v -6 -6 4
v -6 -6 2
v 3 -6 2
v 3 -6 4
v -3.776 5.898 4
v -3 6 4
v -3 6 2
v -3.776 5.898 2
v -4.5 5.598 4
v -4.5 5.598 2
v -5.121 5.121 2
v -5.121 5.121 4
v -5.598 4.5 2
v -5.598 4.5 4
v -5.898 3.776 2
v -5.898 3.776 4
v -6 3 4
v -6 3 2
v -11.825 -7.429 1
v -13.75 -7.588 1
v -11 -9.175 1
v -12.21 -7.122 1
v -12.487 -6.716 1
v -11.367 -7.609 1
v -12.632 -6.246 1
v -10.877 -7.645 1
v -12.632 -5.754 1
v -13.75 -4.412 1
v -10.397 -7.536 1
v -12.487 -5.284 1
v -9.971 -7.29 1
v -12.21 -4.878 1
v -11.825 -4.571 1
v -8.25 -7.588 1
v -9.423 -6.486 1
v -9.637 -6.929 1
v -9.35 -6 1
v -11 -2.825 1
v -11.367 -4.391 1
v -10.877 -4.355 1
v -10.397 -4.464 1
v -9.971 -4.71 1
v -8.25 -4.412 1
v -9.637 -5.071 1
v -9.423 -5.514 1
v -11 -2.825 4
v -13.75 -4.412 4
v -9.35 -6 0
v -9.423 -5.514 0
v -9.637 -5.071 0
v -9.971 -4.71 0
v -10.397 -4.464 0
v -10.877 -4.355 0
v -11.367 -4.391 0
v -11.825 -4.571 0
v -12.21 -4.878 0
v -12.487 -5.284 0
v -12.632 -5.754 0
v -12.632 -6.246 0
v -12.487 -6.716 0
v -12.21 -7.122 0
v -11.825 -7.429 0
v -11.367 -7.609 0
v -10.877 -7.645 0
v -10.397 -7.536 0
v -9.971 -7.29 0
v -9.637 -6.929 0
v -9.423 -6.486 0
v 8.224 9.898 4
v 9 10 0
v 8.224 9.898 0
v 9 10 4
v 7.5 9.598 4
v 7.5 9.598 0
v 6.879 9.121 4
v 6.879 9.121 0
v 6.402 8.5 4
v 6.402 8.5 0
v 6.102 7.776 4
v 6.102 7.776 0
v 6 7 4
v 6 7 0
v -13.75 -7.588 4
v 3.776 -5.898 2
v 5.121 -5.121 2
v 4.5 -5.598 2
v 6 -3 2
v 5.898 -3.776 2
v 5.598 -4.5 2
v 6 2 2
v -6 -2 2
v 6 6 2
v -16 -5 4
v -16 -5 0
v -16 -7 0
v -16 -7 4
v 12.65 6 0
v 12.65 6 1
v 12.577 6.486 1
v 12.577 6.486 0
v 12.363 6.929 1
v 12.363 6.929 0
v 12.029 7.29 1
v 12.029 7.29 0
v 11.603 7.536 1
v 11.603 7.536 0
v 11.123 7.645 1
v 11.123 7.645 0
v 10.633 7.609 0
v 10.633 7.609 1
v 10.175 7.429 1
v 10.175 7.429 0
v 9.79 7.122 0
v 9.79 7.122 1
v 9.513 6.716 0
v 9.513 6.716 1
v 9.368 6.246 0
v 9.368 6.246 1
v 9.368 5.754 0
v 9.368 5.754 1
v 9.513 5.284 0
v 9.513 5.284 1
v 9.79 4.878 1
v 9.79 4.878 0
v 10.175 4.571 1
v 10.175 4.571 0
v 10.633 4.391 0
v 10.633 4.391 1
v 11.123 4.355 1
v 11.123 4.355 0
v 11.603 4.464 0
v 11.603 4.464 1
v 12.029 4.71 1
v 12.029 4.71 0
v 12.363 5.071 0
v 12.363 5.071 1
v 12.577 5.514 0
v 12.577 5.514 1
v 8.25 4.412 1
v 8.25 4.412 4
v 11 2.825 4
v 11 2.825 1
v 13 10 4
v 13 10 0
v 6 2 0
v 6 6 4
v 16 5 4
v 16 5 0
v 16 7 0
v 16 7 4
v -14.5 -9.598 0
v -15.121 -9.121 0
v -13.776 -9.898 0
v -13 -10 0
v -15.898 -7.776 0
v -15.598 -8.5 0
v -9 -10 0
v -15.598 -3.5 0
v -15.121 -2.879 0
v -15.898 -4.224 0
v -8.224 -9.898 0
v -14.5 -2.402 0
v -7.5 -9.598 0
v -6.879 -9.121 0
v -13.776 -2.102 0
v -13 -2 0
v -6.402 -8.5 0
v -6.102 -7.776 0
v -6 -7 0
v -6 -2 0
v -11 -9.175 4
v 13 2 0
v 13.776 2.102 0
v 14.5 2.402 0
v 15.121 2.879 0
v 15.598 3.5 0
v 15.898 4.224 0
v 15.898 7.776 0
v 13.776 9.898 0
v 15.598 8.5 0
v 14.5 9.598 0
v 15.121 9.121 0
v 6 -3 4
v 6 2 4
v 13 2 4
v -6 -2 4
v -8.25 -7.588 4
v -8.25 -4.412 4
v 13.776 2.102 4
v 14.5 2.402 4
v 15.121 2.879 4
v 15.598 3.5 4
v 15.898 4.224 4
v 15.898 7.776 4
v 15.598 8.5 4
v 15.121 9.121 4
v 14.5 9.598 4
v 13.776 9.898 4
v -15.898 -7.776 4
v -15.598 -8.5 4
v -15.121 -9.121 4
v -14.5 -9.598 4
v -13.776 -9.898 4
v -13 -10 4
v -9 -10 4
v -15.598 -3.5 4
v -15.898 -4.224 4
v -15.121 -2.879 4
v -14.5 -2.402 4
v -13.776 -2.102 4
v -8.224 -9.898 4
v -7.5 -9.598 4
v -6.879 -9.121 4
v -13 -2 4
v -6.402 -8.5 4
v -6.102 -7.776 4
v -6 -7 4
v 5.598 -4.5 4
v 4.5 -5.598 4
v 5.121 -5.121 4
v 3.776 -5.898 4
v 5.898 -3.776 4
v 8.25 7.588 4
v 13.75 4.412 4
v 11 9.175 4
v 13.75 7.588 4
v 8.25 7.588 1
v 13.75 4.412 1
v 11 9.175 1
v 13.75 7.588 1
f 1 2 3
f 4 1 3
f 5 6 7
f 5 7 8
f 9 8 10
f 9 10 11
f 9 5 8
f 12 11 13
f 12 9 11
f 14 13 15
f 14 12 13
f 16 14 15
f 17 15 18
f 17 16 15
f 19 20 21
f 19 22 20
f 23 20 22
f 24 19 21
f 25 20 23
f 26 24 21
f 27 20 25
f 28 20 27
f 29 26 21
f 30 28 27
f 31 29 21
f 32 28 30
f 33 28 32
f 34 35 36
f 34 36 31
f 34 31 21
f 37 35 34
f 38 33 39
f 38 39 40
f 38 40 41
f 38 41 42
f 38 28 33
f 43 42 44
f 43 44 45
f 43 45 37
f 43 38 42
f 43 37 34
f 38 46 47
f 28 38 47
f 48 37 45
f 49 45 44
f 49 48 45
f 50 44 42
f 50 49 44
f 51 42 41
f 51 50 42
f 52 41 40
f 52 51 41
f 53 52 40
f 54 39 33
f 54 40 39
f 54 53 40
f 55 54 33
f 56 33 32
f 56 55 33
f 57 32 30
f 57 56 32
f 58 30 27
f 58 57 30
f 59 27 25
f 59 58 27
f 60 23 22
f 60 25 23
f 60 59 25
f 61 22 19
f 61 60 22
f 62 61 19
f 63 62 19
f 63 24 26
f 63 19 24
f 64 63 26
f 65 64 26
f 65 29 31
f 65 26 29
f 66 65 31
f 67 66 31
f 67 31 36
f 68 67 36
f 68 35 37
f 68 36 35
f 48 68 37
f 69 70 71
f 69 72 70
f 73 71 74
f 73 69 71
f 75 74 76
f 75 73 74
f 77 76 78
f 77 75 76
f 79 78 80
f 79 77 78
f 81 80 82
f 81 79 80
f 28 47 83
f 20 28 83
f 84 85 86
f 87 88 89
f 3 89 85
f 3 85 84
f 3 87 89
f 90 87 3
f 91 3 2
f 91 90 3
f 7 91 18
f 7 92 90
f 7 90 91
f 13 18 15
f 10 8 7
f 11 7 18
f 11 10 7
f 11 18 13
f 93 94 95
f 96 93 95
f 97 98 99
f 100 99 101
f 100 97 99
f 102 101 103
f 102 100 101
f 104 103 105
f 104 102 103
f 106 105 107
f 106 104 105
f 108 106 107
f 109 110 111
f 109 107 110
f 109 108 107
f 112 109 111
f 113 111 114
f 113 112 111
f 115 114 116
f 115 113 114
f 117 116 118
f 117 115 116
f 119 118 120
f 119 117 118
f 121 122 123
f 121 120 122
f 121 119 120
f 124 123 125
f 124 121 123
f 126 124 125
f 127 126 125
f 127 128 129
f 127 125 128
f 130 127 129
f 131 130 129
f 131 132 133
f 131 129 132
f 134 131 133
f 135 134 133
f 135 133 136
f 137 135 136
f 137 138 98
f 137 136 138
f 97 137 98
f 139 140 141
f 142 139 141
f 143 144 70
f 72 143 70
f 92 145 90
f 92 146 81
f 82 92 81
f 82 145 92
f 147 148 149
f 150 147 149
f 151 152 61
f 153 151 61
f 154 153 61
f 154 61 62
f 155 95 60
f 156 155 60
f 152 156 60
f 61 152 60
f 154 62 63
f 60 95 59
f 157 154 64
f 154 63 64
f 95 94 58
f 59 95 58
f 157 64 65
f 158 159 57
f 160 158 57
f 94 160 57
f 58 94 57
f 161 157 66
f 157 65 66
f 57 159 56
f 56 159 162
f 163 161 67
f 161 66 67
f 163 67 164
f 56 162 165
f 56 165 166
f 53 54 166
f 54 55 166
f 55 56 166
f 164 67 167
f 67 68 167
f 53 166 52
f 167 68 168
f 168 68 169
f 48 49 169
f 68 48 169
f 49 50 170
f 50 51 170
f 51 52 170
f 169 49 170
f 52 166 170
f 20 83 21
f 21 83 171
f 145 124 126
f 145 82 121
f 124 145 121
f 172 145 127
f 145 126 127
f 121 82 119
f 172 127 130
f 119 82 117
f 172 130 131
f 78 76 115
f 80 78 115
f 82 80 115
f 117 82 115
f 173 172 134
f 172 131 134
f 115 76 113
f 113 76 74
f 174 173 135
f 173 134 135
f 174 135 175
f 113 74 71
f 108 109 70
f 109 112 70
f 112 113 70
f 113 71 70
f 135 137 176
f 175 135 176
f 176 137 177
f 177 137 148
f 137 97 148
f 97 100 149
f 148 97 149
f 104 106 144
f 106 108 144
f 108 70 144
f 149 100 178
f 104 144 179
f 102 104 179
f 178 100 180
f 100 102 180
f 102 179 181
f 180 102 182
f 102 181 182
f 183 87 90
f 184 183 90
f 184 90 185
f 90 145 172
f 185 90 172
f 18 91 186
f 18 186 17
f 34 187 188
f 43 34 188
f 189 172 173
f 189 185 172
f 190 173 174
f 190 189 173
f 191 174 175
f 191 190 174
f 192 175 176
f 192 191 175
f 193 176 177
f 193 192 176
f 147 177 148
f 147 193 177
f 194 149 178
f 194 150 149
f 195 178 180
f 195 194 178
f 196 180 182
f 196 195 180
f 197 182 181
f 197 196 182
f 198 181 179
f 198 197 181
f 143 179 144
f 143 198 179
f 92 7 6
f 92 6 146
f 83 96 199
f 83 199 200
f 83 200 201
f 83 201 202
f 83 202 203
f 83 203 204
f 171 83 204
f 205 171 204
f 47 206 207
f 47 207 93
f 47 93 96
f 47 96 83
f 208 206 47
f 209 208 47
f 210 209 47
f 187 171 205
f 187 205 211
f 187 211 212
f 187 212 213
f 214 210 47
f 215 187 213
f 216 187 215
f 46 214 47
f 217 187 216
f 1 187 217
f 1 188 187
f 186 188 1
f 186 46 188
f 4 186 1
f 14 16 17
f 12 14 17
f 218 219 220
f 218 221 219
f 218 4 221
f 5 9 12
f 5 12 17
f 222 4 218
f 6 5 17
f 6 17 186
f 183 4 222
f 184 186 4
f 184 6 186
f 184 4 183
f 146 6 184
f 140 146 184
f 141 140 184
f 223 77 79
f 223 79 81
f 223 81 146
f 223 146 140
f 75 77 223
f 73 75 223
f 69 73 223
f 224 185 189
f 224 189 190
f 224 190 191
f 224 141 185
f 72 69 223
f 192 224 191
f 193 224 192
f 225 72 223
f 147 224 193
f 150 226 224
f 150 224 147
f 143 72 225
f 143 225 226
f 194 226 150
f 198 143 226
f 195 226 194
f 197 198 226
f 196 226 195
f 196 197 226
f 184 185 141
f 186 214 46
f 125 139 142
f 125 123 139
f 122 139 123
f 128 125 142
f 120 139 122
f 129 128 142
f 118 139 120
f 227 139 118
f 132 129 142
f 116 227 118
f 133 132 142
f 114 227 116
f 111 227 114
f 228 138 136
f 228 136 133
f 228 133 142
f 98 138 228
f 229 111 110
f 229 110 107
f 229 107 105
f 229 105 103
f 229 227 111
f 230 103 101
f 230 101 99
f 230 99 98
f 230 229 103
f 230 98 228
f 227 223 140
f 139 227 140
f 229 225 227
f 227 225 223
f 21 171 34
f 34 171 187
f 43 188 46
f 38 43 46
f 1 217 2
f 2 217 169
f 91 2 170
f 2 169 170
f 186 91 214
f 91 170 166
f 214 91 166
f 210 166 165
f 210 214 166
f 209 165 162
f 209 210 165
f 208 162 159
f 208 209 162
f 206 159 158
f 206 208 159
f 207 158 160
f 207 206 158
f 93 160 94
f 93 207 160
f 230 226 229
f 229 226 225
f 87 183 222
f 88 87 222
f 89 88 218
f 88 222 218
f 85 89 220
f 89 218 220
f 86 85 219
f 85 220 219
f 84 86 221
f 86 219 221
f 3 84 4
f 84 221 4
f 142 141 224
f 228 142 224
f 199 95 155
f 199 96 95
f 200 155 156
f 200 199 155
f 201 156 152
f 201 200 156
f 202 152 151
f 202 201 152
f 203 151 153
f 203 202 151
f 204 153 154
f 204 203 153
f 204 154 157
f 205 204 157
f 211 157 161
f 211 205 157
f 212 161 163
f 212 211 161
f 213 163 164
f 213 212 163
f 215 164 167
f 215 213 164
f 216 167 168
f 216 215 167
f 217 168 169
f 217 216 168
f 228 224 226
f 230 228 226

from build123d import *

# Parameters (mm, degrees)
SKETCH7_R           = 1.65
SKETCH7_W           = 12
SKETCH7_H           = 12
BOSS_EXTRUDE2_DEPTH = 4
CUT_EXTRUDE6_DEPTH  = 3
FILLET3_R           = 3
SKETCH10_W          = 12
SKETCH10_H          = 12
CUT_EXTRUDE7_DEPTH  = 2


with BuildPart() as part:
    # Sketch7 → Boss-Extrude2 (new body)
    # profile 1 of 3: a face of its own
    with BuildSketch(Plane.XY):
        Polygon((-6, -10), (-6, -6), (-6, -2), (-16, -2), (-16, -10), align=None)
        with Locations((-11, -6)):
            Circle(SKETCH7_R, mode=Mode.SUBTRACT)
    # profile 2 of 3: a face of its own
    with BuildSketch(Plane.XY):
        Rectangle(SKETCH7_W, SKETCH7_H)
    # profile 3 of 3: a face of its own
    with BuildSketch(Plane.XY):
        Polygon((6, 6), (6, 2), (16, 2), (16, 10), (6, 10), align=None)
        with Locations((11, 6)):
            Circle(SKETCH7_R, mode=Mode.SUBTRACT)
    extrude(amount=BOSS_EXTRUDE2_DEPTH)

    # Sketch9 → Cut-Extrude6 (cut)
    with BuildSketch(Plane.XY.offset(4)):
        Polygon((-11, -2.824573519), (-13.75, -4.41228676), (-13.75, -7.58771324), (-11, -9.175426481), (-8.25, -7.58771324), (-8.25, -4.41228676), align=None)
        Polygon((11, 2.824573519), (13.75, 4.41228676), (13.75, 7.58771324), (11, 9.175426481), (8.25, 7.58771324), (8.25, 4.41228676), align=None)
    extrude(amount=-CUT_EXTRUDE6_DEPTH, mode=Mode.SUBTRACT)

    # Fillet3
    fillet3_edges = [part.edges().sort_by_distance(p)[0] for p in [
        (-16, -2, 2),
        (-6, 6, 2),
        (6, 10, 2),
        (16, 10, 2),
        (16, 2, 2),
        (6, -6, 2),
        (-6, -10, 2),
        (-16, -10, 2),
    ]]
    fillet(fillet3_edges, radius=FILLET3_R)

    # Sketch10 → Cut-Extrude7 (cut)
    with BuildSketch(Plane(origin=(0, 0, 0), x_dir=(-1, 0, 0), z_dir=(0, 0, -1))):
        Rectangle(SKETCH10_W, SKETCH10_H)
    extrude(amount=-CUT_EXTRUDE7_DEPTH, mode=Mode.SUBTRACT)


solid = part.part
